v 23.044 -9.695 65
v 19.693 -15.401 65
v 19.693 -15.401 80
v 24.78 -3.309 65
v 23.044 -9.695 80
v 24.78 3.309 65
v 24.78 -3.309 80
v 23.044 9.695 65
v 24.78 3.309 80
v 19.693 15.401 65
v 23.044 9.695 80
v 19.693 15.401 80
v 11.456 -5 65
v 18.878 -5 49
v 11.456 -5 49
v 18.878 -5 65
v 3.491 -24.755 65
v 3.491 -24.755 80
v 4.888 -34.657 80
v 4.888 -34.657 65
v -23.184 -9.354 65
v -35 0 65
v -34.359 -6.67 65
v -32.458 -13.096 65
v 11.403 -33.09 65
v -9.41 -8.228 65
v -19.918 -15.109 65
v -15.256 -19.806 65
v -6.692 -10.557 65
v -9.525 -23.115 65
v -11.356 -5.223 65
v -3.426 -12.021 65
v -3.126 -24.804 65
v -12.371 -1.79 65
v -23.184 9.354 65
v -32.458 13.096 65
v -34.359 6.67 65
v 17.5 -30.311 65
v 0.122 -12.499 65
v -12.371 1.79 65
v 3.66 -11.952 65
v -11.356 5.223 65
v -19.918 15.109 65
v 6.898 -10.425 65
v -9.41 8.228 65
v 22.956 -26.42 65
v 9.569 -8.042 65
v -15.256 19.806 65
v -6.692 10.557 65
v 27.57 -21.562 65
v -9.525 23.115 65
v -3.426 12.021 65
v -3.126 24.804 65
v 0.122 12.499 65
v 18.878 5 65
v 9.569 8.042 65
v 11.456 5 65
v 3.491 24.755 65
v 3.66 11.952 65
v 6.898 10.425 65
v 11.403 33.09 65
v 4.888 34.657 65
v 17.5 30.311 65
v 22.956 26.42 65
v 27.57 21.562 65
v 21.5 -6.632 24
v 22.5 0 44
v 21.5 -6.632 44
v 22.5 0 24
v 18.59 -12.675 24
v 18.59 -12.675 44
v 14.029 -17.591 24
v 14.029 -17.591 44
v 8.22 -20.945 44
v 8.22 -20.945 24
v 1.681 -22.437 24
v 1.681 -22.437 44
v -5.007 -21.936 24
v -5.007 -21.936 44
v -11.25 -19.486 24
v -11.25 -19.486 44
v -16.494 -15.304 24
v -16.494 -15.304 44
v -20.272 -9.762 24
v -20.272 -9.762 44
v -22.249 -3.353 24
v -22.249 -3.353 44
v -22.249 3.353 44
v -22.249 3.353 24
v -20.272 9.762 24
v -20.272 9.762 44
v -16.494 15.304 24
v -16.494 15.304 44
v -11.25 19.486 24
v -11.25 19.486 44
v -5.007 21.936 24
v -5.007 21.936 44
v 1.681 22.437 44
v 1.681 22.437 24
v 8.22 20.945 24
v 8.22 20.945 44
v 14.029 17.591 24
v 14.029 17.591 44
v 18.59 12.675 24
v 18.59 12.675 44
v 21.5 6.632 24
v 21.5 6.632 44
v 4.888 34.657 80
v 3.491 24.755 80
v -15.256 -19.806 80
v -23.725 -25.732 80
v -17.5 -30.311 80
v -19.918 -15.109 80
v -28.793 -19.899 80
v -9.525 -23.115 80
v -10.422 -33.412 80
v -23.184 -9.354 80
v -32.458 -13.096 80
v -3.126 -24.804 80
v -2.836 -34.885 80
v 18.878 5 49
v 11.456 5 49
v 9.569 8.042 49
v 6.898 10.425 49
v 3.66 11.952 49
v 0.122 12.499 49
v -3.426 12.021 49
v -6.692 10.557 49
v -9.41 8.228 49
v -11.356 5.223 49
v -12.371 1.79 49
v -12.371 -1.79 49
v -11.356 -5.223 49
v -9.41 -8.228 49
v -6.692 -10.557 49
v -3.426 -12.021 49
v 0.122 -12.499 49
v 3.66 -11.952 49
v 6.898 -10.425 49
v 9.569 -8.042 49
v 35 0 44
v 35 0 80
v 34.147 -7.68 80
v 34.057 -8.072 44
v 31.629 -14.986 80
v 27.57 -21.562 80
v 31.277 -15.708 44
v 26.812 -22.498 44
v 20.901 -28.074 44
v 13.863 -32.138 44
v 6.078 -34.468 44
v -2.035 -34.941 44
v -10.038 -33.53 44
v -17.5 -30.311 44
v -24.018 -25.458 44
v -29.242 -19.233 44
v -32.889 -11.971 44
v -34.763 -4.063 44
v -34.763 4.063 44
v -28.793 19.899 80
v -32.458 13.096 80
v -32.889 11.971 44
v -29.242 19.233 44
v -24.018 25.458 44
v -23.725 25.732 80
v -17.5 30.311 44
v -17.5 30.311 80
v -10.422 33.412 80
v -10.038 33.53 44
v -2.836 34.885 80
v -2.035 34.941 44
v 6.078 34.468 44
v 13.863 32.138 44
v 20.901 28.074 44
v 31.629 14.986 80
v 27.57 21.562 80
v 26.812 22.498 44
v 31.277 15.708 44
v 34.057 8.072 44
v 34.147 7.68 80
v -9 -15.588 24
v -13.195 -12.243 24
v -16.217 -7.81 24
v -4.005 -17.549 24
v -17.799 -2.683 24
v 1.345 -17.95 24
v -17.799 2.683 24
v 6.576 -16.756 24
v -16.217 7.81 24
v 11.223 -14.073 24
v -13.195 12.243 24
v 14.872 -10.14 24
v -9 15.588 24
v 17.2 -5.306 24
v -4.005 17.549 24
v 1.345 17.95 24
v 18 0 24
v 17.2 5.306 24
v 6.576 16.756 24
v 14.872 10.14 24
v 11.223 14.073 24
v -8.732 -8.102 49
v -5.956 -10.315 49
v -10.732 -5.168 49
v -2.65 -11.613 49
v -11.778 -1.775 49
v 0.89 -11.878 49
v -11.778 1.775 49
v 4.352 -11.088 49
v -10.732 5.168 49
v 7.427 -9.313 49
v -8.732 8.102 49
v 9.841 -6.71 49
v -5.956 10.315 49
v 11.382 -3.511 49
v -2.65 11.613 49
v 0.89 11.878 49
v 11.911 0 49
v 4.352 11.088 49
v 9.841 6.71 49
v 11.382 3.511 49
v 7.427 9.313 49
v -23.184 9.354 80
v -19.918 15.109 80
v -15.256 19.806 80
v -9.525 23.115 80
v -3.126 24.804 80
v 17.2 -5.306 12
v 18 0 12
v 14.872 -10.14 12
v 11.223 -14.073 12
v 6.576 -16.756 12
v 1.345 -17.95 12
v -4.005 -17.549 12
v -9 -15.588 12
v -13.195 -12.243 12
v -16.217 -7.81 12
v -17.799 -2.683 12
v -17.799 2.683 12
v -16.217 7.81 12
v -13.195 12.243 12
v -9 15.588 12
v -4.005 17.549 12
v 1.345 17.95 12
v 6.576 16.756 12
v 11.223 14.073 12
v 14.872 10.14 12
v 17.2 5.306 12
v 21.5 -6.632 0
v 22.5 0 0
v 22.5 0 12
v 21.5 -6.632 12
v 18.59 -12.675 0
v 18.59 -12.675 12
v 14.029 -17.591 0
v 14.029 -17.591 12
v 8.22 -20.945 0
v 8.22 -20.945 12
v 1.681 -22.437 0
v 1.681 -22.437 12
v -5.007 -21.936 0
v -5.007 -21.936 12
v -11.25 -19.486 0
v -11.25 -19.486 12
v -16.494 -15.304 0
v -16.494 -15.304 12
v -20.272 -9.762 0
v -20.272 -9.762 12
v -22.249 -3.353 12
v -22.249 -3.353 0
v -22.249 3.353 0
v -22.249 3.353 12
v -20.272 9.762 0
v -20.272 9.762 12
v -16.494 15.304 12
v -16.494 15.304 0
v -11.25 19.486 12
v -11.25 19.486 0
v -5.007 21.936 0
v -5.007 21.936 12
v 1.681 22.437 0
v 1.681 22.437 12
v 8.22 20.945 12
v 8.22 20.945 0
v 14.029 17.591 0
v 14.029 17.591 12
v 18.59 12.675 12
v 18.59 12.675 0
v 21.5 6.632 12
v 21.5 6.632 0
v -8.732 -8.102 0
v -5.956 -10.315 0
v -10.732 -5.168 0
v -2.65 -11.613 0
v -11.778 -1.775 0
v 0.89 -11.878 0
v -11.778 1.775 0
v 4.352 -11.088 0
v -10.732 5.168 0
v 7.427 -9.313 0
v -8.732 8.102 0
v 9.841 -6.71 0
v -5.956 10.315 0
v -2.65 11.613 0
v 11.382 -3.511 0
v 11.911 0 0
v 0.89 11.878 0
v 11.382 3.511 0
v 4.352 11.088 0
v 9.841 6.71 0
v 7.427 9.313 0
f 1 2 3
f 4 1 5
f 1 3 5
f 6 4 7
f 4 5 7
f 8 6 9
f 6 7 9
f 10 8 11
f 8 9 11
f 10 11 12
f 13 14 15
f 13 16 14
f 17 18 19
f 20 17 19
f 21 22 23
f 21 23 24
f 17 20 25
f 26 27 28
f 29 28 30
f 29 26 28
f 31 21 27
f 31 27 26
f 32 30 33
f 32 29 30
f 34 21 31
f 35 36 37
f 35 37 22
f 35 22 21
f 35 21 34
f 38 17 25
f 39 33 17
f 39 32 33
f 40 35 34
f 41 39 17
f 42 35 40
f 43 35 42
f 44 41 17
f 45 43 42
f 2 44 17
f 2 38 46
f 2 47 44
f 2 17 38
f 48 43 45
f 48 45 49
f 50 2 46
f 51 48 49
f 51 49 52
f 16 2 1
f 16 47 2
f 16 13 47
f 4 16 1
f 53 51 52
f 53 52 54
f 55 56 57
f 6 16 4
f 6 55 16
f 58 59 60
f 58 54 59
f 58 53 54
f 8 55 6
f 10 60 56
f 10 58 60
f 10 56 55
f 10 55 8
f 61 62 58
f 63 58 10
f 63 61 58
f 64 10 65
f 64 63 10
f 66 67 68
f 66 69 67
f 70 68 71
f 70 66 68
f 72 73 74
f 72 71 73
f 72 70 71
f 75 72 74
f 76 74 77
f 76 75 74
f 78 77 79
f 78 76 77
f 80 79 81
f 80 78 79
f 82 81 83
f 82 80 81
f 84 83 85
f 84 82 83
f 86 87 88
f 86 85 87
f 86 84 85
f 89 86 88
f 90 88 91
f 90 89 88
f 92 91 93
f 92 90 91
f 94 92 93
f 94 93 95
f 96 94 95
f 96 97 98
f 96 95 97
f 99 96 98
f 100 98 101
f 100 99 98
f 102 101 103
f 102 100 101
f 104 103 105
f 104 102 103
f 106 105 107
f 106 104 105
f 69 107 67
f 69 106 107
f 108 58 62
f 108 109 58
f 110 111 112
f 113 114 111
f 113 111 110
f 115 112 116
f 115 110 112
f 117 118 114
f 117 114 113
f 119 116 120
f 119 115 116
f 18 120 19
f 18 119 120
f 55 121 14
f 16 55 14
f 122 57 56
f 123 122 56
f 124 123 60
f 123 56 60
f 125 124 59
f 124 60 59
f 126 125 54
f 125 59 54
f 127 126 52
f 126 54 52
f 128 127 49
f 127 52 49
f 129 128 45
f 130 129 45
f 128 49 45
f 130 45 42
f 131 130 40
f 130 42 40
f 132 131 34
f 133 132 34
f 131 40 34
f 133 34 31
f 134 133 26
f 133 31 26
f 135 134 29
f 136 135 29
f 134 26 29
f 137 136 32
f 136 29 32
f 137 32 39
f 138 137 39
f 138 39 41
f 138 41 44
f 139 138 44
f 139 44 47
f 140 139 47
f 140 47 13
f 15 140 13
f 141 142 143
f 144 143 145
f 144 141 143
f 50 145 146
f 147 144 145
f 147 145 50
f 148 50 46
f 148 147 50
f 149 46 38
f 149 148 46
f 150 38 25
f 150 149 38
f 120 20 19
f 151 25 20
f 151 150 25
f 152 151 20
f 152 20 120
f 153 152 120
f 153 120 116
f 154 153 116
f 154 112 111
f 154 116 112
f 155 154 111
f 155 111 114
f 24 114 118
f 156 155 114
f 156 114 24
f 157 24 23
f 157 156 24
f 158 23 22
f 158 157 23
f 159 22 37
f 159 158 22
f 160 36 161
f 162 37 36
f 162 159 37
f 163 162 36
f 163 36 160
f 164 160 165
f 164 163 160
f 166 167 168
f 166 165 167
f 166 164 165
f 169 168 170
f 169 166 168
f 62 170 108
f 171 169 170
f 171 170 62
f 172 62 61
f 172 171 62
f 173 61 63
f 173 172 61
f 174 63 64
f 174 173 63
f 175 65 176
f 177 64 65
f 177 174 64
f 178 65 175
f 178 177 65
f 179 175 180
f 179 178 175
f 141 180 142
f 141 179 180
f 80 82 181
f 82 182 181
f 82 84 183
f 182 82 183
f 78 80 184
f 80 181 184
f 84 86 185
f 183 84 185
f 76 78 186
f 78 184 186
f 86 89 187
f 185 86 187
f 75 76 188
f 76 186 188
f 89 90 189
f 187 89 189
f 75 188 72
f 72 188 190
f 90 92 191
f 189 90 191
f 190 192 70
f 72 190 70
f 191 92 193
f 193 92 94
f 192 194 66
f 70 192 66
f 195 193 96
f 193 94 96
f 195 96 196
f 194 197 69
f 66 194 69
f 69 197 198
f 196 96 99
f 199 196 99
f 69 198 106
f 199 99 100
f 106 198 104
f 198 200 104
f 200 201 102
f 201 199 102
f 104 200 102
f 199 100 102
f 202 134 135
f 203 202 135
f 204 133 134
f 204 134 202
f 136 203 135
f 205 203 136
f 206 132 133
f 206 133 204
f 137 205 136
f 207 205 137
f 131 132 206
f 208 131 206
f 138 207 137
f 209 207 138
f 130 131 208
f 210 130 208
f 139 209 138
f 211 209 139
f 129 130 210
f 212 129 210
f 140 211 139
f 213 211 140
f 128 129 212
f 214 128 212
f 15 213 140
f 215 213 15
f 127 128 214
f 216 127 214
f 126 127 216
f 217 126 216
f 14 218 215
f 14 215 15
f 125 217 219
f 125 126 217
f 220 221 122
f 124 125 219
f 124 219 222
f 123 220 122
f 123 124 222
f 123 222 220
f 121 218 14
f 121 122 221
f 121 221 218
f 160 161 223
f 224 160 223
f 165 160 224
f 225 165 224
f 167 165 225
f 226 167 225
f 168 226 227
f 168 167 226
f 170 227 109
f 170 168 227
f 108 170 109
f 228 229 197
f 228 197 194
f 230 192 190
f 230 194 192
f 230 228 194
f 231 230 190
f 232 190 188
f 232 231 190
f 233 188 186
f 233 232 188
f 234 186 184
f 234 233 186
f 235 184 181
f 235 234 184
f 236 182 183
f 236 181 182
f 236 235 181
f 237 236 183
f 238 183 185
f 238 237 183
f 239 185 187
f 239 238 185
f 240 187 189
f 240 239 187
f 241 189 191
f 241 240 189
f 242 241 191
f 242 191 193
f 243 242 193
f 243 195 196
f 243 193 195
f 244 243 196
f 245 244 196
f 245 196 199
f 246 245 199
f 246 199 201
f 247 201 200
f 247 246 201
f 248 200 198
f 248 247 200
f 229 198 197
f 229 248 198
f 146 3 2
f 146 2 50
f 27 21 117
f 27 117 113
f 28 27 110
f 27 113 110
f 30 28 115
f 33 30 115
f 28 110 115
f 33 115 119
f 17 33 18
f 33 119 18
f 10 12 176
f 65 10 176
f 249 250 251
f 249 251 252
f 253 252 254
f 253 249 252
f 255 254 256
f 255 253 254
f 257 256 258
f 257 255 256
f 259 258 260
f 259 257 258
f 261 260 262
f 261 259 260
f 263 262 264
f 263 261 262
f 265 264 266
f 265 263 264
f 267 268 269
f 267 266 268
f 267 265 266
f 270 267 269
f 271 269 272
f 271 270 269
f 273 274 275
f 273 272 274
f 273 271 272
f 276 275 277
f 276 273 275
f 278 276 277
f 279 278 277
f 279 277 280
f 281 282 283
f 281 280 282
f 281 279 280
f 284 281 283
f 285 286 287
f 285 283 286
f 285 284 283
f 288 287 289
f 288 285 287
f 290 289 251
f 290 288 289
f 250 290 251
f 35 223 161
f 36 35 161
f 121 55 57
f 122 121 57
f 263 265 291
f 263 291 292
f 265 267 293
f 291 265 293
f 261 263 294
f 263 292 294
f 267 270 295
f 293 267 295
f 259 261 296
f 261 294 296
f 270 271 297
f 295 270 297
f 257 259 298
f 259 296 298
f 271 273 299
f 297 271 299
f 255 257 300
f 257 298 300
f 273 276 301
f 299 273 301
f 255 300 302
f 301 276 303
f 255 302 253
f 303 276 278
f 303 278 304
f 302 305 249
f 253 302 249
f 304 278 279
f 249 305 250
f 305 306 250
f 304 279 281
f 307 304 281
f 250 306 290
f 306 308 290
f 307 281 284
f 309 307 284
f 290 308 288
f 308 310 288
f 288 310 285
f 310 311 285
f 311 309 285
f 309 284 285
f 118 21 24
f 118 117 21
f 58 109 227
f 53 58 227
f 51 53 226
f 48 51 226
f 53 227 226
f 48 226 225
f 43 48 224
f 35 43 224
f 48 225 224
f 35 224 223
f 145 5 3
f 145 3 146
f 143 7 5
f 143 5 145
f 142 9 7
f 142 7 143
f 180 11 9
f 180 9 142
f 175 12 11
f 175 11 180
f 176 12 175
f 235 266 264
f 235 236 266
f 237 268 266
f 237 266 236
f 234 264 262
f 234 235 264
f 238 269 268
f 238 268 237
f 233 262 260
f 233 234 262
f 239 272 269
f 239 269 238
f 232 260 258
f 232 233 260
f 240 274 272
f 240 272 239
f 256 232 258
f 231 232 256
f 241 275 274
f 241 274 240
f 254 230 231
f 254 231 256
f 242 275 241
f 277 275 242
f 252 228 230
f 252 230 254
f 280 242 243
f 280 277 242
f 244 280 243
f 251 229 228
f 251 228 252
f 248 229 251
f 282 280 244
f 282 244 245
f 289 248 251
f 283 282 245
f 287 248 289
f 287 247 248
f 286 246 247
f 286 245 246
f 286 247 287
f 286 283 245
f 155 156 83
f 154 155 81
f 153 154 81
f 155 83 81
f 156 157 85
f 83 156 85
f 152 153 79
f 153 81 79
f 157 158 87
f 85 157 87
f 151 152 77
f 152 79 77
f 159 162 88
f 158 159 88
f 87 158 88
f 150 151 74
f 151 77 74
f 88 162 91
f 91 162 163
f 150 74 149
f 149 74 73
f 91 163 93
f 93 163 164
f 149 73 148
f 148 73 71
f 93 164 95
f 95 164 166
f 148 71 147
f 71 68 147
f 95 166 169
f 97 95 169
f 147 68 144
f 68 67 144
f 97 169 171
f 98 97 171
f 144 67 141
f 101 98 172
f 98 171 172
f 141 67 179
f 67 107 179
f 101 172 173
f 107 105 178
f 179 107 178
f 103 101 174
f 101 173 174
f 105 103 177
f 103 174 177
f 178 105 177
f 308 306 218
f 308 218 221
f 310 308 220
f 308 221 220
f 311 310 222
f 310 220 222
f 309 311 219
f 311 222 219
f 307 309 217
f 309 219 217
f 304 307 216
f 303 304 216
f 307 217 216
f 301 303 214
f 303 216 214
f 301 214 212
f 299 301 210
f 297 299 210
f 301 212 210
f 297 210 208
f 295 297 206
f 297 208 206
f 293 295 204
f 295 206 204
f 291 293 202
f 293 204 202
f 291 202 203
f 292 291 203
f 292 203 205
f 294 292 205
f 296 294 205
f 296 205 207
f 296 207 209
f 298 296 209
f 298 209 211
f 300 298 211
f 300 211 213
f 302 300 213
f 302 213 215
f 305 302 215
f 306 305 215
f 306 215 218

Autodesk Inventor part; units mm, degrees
ref_plane "YZ Plane" through (0, 0, 0) normal (1, 0, 0) x (0, 1, 0)
ref_plane "XZ Plane" through (0, 0, 0) normal (0, 1, 0) x (-1, 0, 0)
ref_plane "XY Plane" through (0, 0, 0) normal (0, 0, 1) x (1, 0, 0)
sketch "Sketch1" plane through (0, 0, 0) normal (0, 0, 1) x (1, 0, 0)
  circle A0 centre (0, 0) radius 22.5
extrude "Extrusion1" add sketch "Sketch1" along normal blind 12
sketch "Sketch2" plane through (0, 0, 12) normal (0, 0, 1) x (1, 0, 0)
  circle A0 centre (0, 0) radius 18
extrude "Extrusion2" add sketch "Sketch2" along normal blind 12
sketch "Sketch3" plane through (0, 0, 24) normal (0, 0, 1) x (1, 0, 0)
  circle A0 centre (0, 0) radius 22.5
extrude "Extrusion3" add sketch "Sketch3" along normal blind 20
sketch "Sketch4" plane through (0, 0, 44) normal (0, 0, 1) x (1, 0, 0)
  circle A0 centre (0, 0) radius 35
extrude "Extrusion4" add sketch "Sketch4" along normal blind 36
sketch "Sketch5" plane through (0, 0, 80) normal (0, 0, 1) x (1, 0, 0)
  circle A0 centre (0, 0) radius 25
extrude "Extrusion5" cut sketch "Sketch5" against normal blind 15
sketch "Sketch6" plane through (0, 0, 80) normal (0, 0, 1) x (1, 0, 0)
  circle A0 centre (0, 0) radius 35 projected
  line L0 (0, 0) -> (-32.4578, -13.0955)
  line L1 (0, 0) -> (-32.4578, 13.0955)
  arc A1 (-32.4578, 13.0955) -> (-32.4578, -13.0955) centre (0, 0) ccw
  line L2 (0, 0) -> (27.5699, -21.5615)
  line L3 (0, 0) -> (4.8879, -34.657)
  arc A2 (4.8879, -34.657) -> (27.5699, -21.5615) centre (0, 0) ccw
  line L4 (0, 0) -> (4.8879, 34.657)
  line L5 (0, 0) -> (27.5699, 21.5615)
  arc A3 (27.5699, 21.5615) -> (4.8879, 34.657) centre (0, 0) ccw
  dimension "d17" = 360
extrude "Extrusion6" cut sketch "Sketch6" against normal blind 15 contours L5 L4 A0 | A0 L3 L2 | L0 A0 L1
sketch "Sketch7" plane through (0, 0, 65) normal (0, 0, 1) x (1, 0, 0)
  arc A0 (11.4564, 5) -> (11.4564, -5) centre (0, 0) ccw
  line L0 (18.8783, 0) -> (18.8783, 5)
  line L1 (18.8783, 0) -> (18.8783, -5)
  line L2 (18.8783, -5) -> (11.4564, -5)
  line L3 (18.8783, 5) -> (11.4564, 5)
extrude "Extrusion7" cut sketch "Sketch7" against normal blind 16
sketch "Sketch8" plane through (0, 0, 0) normal (0, 0, -1) x (-1, 0, 0)
  point P0 (0, 0)
sketch "Sketch9" plane through (0, 0, 49) normal (0, 0, 1) x (1, 0, 0)
  circle A0 centre (0, 0) radius 11.9112
extrude "Extrusion8" cut sketch "Sketch9" against normal blind 50.8
properties part number "tarea 3 dinamica" material "Iron, Ductile"
